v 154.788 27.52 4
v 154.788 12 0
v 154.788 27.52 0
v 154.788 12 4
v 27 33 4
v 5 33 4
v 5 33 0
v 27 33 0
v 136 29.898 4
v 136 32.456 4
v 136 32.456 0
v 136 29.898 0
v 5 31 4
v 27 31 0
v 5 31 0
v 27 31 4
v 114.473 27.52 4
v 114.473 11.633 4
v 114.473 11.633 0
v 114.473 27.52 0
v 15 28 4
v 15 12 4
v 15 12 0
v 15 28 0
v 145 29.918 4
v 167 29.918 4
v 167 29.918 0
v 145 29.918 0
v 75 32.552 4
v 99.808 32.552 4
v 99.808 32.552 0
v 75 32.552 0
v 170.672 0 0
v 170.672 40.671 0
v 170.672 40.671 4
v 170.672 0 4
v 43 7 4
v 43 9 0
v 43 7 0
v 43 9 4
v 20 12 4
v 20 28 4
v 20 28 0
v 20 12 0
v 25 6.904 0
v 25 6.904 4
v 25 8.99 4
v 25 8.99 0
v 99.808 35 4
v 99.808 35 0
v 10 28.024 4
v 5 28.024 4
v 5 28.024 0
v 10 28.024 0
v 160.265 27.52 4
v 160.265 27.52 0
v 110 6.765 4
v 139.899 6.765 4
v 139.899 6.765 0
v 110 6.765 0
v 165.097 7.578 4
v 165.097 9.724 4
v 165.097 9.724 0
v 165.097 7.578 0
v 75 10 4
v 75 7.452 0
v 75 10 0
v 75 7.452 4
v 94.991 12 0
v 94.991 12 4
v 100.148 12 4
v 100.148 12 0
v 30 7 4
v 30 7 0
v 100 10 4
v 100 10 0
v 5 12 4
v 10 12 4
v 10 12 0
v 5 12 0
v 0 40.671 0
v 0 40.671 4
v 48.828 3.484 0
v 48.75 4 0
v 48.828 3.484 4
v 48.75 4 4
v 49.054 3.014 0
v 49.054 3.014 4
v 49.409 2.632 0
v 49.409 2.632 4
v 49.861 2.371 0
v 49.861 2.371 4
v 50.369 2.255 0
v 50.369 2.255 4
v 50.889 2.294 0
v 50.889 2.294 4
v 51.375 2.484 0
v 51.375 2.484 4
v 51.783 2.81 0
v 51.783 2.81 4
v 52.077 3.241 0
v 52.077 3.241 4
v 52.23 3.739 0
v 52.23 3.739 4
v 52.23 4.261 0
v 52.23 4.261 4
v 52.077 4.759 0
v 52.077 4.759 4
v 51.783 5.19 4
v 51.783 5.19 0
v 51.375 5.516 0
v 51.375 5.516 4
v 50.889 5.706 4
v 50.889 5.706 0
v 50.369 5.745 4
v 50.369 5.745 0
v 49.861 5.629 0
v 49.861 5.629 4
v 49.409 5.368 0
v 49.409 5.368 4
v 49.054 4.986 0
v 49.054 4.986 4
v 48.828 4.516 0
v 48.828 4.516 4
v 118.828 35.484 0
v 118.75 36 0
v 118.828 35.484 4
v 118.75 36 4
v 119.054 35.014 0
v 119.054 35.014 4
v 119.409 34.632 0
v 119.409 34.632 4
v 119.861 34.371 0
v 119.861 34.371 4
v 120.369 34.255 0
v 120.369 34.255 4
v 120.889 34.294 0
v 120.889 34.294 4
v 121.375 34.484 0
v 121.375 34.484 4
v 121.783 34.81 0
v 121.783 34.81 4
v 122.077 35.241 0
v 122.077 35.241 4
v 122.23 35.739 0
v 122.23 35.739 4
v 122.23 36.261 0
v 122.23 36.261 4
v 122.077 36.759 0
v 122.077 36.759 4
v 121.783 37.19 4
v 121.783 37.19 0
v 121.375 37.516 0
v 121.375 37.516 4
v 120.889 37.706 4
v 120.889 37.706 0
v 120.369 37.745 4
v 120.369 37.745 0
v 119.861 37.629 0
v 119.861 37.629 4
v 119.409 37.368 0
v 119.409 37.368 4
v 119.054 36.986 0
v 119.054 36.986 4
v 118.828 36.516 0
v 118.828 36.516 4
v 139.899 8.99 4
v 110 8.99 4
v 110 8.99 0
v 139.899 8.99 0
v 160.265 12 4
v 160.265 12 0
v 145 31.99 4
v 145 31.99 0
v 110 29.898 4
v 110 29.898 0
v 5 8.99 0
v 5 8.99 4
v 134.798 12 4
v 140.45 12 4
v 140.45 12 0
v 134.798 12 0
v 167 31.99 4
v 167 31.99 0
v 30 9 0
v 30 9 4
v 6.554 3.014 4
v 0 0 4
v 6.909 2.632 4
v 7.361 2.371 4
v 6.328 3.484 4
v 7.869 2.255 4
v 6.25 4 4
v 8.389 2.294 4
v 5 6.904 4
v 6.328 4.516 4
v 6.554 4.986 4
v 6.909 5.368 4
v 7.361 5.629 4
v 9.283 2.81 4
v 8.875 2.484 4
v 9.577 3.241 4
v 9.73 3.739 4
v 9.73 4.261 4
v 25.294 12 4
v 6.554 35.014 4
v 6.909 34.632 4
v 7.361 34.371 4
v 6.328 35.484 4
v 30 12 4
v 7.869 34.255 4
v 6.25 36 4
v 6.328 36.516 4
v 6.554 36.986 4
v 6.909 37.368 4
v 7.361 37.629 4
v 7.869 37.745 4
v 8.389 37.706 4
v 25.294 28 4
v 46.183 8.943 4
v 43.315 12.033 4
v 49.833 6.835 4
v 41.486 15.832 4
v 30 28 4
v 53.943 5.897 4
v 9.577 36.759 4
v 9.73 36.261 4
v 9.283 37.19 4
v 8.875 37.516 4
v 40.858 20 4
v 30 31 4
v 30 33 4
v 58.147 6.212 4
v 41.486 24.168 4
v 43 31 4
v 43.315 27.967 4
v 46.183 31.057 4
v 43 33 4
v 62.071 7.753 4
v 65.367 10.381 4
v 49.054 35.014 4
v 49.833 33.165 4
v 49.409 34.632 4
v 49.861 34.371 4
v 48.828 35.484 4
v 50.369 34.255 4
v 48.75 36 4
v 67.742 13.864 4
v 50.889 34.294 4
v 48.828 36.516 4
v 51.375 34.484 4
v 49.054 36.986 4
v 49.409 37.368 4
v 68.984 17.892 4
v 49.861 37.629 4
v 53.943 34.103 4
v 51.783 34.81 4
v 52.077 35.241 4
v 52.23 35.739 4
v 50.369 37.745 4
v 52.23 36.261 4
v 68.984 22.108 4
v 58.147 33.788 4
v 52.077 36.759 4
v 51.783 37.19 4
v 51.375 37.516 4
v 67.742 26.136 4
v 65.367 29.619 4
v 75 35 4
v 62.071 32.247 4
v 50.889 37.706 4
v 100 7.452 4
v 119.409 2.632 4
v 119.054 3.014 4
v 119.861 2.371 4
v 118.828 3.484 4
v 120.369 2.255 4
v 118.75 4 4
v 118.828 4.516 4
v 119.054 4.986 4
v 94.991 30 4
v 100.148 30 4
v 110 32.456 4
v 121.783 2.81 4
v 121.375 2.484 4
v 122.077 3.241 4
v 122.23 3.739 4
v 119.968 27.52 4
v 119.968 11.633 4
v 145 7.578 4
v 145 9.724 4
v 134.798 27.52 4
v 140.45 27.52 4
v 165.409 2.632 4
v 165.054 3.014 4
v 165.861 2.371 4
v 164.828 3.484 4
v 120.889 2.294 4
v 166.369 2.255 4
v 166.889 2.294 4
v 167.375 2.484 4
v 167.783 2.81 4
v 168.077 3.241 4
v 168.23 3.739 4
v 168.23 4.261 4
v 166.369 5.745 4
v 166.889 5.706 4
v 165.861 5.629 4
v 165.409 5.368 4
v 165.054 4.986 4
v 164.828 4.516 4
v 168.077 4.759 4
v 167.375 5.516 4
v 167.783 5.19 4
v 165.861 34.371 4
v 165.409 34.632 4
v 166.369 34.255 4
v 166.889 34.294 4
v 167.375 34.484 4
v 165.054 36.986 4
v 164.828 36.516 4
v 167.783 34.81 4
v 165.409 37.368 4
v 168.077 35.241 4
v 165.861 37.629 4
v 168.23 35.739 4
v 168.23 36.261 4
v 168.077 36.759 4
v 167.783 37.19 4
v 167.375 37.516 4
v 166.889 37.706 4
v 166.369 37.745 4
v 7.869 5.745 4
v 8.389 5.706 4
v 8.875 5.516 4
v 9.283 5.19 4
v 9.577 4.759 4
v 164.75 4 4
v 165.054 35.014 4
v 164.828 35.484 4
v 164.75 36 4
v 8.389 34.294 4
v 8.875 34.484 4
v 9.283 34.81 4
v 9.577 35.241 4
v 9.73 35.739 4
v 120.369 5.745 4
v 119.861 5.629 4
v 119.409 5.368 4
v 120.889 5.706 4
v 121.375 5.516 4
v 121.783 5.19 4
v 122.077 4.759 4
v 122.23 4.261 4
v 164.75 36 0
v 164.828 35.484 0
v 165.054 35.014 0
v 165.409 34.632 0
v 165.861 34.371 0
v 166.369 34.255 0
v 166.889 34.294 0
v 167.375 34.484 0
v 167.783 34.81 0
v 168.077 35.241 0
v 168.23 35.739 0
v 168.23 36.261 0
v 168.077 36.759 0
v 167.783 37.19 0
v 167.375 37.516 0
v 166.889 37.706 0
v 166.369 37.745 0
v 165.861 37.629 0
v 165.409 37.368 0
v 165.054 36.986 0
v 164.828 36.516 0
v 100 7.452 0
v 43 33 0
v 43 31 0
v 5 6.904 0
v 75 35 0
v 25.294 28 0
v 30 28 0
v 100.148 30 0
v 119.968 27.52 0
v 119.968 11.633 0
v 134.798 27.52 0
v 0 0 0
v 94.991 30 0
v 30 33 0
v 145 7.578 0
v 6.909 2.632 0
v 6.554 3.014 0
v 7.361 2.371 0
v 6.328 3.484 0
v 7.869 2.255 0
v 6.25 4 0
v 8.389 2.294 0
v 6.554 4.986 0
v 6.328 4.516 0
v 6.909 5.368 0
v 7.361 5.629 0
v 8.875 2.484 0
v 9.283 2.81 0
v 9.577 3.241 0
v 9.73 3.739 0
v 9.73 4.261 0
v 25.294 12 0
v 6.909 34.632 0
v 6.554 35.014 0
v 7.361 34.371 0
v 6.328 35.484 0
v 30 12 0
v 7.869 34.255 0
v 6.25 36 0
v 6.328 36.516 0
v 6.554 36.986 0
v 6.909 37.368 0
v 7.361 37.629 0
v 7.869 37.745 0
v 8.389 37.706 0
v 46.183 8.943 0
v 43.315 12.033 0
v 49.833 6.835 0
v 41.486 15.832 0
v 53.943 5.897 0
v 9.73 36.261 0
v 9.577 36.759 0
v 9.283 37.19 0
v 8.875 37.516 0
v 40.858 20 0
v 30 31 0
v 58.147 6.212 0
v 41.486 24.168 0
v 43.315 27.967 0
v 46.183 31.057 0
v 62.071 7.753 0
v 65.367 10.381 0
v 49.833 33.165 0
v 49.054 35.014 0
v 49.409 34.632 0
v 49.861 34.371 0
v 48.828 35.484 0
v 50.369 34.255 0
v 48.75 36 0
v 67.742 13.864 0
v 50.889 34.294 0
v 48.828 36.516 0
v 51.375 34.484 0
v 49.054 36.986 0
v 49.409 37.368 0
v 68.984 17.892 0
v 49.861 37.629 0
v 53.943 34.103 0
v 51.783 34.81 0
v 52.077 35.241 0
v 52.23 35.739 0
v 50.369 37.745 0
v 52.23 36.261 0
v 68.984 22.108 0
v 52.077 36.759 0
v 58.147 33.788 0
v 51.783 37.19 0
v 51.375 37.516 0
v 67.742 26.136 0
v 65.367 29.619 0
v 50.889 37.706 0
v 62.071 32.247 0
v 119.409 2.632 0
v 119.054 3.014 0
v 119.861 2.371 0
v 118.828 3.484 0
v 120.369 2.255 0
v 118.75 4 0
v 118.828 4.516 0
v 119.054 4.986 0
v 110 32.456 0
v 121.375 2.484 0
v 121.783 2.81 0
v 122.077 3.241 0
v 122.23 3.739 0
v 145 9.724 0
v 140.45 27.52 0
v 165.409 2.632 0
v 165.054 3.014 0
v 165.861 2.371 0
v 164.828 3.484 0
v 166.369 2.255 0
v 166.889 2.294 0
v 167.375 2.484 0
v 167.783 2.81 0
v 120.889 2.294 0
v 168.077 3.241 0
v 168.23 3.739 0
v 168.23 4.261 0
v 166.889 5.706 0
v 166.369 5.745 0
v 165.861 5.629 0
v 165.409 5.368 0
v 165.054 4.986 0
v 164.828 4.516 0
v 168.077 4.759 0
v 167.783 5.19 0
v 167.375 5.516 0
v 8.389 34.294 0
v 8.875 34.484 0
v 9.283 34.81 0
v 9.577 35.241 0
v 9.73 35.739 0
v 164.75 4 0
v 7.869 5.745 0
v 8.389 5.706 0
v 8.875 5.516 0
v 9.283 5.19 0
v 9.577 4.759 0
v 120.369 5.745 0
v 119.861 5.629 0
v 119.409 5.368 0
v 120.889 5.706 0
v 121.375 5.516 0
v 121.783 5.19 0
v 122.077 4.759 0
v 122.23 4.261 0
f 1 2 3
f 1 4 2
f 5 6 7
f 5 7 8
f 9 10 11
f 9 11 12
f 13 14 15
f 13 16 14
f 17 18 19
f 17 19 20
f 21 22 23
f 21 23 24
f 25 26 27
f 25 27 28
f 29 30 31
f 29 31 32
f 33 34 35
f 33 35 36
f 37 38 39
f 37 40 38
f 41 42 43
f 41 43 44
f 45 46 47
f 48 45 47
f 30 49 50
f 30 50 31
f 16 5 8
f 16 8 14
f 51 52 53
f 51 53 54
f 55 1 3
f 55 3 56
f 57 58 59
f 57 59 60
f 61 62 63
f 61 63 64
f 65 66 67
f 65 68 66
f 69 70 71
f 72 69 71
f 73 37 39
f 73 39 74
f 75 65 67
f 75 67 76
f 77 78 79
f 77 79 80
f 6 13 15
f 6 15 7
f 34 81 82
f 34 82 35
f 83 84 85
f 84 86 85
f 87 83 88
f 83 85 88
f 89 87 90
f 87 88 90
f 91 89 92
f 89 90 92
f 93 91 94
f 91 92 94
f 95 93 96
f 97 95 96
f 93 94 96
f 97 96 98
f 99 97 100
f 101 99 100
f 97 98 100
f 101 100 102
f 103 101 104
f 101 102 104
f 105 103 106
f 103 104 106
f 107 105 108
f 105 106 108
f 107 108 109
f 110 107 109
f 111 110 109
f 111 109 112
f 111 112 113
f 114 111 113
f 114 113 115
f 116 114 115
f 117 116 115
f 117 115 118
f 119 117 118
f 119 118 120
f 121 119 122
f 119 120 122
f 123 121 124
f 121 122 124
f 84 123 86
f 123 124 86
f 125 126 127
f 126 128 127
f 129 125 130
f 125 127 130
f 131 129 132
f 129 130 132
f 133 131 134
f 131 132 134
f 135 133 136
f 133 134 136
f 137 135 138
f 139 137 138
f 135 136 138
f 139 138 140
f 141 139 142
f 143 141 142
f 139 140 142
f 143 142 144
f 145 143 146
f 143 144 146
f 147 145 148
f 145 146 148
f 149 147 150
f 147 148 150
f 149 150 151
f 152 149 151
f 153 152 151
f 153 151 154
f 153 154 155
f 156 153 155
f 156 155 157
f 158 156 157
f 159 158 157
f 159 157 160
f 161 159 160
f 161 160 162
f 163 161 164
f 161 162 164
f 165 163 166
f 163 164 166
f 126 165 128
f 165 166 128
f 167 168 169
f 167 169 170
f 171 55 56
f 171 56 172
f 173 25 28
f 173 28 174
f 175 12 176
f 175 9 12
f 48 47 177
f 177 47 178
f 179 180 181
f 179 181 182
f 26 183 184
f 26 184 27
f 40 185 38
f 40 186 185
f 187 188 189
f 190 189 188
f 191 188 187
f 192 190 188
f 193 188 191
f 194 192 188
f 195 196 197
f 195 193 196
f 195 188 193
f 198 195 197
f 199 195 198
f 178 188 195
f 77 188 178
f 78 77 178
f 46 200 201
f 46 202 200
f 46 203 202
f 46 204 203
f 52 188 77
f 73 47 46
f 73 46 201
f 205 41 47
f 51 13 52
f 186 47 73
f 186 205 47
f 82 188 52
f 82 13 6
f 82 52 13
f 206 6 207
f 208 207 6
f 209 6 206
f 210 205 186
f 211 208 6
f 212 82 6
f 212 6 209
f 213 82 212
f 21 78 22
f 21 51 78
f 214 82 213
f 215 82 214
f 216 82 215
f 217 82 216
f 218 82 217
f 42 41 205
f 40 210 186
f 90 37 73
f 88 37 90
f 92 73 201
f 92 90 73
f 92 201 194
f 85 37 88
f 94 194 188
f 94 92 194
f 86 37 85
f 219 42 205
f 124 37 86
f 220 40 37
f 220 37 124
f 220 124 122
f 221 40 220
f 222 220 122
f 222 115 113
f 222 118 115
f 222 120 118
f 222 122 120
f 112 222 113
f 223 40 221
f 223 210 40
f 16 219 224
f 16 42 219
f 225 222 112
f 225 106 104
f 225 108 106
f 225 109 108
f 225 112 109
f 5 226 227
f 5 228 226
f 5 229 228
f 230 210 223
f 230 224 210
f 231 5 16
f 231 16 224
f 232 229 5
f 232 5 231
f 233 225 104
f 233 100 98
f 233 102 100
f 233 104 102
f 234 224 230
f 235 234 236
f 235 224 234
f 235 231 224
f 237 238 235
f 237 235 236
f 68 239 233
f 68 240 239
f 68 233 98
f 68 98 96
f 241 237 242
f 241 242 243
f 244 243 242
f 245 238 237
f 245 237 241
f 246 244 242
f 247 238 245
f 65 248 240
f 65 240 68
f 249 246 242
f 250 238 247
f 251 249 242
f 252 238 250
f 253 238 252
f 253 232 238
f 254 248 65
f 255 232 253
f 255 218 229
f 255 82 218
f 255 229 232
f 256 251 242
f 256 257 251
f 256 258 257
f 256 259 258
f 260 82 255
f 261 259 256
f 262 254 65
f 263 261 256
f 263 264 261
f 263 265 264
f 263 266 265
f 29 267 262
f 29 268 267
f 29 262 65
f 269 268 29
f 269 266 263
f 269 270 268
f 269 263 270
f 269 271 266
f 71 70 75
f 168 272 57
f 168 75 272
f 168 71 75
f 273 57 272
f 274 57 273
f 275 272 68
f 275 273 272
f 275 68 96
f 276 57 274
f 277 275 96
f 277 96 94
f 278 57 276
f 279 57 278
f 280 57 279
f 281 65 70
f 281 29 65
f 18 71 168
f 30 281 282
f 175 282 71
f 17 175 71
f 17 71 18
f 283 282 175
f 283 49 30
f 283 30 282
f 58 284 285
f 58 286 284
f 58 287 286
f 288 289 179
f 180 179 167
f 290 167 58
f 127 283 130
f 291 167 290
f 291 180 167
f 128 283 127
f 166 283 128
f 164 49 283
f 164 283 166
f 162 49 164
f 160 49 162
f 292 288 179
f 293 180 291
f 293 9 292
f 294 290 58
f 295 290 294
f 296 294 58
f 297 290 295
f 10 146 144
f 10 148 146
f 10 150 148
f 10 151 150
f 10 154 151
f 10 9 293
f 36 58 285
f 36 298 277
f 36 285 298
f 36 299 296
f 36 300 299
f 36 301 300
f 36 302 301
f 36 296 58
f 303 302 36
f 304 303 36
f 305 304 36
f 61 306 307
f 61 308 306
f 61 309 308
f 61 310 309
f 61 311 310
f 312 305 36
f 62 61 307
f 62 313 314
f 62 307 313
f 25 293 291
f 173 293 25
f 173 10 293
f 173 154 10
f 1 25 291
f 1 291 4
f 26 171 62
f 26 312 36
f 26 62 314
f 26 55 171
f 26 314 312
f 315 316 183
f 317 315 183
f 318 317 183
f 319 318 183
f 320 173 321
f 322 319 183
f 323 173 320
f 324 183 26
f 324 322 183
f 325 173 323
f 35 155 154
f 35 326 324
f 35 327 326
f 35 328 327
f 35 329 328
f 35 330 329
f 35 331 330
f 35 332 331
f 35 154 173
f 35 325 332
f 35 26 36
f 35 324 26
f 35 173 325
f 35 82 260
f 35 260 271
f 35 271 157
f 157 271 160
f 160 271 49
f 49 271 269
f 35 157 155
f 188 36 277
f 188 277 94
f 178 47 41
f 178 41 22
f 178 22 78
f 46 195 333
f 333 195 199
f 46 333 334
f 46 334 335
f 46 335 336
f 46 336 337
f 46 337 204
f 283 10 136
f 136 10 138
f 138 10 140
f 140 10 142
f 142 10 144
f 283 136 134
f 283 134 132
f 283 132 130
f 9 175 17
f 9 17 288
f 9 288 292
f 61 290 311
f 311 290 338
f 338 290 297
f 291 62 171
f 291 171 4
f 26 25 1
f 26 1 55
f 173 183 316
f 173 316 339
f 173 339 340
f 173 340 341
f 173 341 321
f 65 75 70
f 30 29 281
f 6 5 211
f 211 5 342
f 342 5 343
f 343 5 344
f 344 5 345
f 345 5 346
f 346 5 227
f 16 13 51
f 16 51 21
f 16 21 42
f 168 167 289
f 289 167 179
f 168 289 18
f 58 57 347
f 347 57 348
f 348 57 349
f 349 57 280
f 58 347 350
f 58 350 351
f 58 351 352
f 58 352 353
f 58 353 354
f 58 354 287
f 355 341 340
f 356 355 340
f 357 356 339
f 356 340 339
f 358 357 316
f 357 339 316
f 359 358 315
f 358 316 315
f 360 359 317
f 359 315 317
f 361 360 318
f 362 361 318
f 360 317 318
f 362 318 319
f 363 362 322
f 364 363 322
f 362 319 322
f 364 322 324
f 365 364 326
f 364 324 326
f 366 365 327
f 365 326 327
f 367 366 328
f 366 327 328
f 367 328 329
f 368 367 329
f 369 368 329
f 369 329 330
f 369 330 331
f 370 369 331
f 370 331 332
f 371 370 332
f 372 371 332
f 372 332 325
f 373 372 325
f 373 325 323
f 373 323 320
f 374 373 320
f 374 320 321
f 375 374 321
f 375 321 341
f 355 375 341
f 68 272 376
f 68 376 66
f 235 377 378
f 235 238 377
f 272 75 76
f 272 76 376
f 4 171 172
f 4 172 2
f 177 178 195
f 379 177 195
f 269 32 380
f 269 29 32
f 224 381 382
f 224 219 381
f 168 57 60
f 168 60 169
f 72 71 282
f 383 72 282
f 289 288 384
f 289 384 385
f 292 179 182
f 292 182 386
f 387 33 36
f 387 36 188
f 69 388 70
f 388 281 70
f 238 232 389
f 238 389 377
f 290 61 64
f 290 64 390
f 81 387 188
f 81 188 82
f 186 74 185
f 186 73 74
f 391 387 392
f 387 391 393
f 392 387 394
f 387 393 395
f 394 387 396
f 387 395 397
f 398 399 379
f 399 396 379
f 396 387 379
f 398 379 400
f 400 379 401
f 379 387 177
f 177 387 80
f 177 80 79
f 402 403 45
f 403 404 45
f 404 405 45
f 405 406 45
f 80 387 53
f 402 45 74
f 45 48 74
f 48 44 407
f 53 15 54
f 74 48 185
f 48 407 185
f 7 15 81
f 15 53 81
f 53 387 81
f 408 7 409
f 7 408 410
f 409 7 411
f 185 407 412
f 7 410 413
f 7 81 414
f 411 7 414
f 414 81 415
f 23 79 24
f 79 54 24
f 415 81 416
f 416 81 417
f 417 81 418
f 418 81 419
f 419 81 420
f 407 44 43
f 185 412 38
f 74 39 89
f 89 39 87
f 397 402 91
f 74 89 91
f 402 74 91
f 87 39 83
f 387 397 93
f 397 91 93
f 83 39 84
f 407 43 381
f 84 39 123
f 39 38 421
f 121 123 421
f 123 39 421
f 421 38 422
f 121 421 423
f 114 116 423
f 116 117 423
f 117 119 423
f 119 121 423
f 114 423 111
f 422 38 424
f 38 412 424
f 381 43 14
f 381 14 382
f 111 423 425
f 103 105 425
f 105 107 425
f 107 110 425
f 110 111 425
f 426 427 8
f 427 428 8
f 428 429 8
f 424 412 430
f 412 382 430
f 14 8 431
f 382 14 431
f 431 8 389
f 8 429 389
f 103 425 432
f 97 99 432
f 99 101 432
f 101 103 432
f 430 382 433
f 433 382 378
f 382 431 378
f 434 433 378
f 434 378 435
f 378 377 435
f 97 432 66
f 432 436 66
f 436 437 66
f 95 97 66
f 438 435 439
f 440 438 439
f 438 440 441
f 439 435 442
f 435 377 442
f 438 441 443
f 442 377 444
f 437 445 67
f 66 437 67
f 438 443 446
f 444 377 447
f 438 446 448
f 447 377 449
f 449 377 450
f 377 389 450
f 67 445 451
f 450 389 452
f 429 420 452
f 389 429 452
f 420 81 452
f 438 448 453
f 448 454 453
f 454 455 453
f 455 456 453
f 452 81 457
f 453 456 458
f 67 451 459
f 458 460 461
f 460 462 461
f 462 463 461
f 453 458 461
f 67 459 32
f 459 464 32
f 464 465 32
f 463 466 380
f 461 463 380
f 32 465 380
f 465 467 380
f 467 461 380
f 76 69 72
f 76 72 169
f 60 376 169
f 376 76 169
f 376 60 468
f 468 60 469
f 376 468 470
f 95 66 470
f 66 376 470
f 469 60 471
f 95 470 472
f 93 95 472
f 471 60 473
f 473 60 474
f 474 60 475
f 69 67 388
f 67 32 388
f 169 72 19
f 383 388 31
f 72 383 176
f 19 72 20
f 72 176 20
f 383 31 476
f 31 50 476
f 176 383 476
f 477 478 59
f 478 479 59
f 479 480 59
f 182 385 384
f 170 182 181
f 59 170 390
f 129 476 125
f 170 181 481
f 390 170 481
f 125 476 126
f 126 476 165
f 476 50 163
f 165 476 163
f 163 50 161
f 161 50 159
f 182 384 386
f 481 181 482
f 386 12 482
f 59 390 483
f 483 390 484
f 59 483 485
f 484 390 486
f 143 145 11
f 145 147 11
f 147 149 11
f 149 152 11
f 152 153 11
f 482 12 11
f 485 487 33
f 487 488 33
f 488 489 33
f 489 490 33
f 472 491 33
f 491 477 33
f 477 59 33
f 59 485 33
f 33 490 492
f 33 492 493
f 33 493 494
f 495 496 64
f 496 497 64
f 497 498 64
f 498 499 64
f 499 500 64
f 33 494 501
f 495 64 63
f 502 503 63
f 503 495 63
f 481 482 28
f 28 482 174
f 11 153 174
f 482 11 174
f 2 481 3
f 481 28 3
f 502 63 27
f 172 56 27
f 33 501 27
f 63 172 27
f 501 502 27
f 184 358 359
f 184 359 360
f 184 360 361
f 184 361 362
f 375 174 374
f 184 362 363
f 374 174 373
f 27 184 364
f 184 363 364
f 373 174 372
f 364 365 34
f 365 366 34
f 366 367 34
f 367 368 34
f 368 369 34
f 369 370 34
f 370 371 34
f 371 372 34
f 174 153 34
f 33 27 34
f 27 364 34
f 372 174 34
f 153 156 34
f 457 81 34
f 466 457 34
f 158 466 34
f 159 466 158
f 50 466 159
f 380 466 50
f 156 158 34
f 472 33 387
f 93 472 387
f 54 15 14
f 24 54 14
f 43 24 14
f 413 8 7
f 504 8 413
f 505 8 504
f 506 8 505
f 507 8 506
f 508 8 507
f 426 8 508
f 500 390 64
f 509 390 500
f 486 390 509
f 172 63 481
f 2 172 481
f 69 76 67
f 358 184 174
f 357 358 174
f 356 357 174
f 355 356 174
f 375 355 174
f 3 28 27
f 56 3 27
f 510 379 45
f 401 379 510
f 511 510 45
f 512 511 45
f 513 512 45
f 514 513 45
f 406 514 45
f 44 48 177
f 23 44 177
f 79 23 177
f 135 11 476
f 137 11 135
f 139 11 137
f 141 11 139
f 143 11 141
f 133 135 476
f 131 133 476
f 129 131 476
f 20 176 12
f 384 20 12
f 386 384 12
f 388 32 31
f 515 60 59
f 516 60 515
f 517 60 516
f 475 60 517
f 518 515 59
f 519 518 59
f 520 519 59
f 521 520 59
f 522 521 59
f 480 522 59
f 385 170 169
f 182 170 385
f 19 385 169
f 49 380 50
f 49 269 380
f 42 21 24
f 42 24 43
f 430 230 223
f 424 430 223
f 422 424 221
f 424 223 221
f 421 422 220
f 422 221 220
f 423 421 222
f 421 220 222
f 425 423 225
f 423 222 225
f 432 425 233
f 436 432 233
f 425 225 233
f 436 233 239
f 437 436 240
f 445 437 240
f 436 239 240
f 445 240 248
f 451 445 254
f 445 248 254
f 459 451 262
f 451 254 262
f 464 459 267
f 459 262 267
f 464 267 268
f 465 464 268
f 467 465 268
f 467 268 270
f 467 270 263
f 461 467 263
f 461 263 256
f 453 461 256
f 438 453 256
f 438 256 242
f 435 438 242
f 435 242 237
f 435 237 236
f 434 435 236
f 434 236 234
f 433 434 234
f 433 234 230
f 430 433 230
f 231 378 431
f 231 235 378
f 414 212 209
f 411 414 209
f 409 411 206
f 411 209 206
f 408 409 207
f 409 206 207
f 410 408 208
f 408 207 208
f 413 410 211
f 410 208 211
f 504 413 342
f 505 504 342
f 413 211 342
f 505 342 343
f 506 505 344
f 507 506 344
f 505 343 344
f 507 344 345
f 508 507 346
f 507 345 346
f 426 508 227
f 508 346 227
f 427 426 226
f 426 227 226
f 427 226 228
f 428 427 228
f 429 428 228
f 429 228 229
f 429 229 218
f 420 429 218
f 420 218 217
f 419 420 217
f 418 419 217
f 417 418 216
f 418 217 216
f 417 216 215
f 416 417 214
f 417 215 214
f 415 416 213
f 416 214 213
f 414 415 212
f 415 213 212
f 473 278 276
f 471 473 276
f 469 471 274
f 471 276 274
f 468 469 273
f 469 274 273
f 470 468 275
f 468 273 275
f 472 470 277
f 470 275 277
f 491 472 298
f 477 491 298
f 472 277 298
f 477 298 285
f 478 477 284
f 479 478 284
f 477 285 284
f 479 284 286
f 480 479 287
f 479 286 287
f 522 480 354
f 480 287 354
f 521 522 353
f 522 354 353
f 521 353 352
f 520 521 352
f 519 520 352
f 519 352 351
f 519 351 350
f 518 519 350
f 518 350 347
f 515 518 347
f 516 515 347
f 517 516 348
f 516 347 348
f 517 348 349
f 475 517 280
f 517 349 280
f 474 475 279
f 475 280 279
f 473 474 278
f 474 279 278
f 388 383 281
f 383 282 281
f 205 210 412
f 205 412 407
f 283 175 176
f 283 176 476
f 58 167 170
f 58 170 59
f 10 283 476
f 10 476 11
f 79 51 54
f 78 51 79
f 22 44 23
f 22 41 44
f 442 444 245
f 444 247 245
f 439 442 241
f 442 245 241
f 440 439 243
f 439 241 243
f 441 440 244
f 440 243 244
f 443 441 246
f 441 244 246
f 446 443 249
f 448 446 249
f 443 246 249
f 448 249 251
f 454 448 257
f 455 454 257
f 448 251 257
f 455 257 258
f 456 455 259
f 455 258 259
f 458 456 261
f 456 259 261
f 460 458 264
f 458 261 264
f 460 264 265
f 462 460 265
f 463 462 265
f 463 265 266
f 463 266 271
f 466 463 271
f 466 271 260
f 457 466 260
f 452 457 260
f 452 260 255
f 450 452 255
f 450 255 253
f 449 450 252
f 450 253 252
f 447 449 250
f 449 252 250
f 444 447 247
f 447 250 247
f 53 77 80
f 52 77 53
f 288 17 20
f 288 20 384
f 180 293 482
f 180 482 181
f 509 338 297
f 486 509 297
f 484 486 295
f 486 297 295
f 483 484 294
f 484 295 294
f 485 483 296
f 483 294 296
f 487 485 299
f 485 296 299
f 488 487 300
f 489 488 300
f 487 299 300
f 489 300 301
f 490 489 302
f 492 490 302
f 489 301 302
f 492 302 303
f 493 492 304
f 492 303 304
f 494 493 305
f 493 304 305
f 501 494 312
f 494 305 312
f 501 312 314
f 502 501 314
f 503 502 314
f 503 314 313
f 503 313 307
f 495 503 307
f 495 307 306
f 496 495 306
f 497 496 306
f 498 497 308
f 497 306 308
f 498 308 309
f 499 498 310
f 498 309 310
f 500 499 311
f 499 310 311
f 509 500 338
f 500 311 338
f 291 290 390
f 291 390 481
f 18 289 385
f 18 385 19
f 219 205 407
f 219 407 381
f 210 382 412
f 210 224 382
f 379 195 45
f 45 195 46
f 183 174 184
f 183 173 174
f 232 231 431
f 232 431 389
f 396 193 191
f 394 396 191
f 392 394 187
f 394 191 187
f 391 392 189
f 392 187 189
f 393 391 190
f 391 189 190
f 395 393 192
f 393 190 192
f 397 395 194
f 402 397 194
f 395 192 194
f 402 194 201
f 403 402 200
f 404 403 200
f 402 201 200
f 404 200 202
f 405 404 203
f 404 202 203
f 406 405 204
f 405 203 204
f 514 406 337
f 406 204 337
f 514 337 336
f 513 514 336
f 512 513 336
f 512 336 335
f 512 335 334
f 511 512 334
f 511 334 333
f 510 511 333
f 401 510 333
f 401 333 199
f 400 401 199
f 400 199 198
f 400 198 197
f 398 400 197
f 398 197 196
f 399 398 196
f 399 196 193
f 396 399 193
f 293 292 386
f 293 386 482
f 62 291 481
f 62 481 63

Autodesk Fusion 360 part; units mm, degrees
sketch "Sketch1" plane through (0, 0, 0) normal (0, 0, 1) x (1, 0, 0)
  line L0 (0, 40.6706) -> (170.6716, 40.6706)
  line L1 (170.6716, 40.6706) -> (170.6716, 0)
  line L2 (170.6716, 0) -> (0, 0)
  line L3 (0, 0) -> (0, 40.6706)
sketch "Sketch2" plane through (0, 0, 0) normal (0, 0, 1) x (1, 0, 0)
  circle A0 centre (2.5, 4) radius 1.75
  line L0 (170.6716, 0) -> (0, 0)
  line L1 (0, 0) -> (0, 40.6706)
  dimension "d1" = 3.5
  dimension "d2" = 4
  dimension "d3" = 2.5
sketch "Sketch4" plane through (0, 0, 0) normal (0, 0, 1) x (1, 0, 0)
  circle A0 centre (49.5, 4) radius 1.75
  circle A1 centre (2.5, 4) radius 1.75
  dimension "d9" = 3.5
  dimension "d10" = 47
extrude "Extrude1" add sketch "Sketch1" along normal blind 4
sketch "Sketch11" plane through (0, 0, 4) normal (0, 0, 1) x (-1, 0, 0)
  line L0 (0, 0) -> (-170.6716, 0)
  line L1 (-170.6716, 0) -> (-170.6716, -40.6706)
  line L2 (-170.6716, -40.6706) -> (0, -40.6706)
  line L3 (0, -40.6706) -> (0, 0)
  line L4 (-5, -30) -> (-150, -30)
  line L5 (-150, -30) -> (-150, -10)
  line L6 (-150, -10) -> (-5, -10)
  line L7 (-5, -10) -> (-5, -30)
sketch "Sketch13" plane through (0, 0, 4) normal (0, 0, 1) x (-1, 0, 0)
  line L0 (0, 0) -> (-170.6716, 0)
  line L1 (-170.6716, 0) -> (-170.6716, -40.6706)
  line L2 (-170.6716, -40.6706) -> (0, -40.6706)
  line L3 (0, -40.6706) -> (0, 0)
  circle A0 centre (-8, -4) radius 1.75
  circle A1 centre (-8, -36) radius 1.75
  circle A2 centre (-50.5, -36) radius 1.75
  circle A3 centre (-50.5, -4) radius 1.75
  circle A4 centre (-120.5, -4) radius 1.75
  circle A5 centre (-120.5, -36) radius 1.75
  circle A6 centre (-166.5, -4) radius 1.75
  circle A7 centre (-166.5, -36) radius 1.75
  dimension "d44" = 3.5
  dimension "d45" = 4
  dimension "d46" = 3.5
  dimension "d47" = 32
  dimension "d48" = 8
  dimension "d49" = 8
  dimension "d50" = 3.5
  dimension "d52" = 3.5
  dimension "d53" = 4
  dimension "d55" = 32
  dimension "d56" = 3.5
  dimension "d58" = 4
  dimension "d59" = 3.5
  dimension "d60" = 32
  dimension "d62" = 3.5
  dimension "d63" = 46
  dimension "d64" = 4
  dimension "d65" = 3.5
  dimension "d66" = 46
  dimension "d67" = 32
extrude "Extrude5" cut sketch "Sketch13" against normal blind 15 contours A0 | A1 | A2 | A3 | A4 | A5 | A6 | A7
sketch "Sketch16" plane through (0, 0, 4) normal (0, 0, 1) x (-1, 0, 0)
  circle A0 centre (-120.5, -36) radius 1.75
  circle A1 centre (-50.5, -36) radius 1.75
  circle A2 centre (-50.5, -4) radius 1.75
  circle A3 centre (-120.5, -4) radius 1.75
  circle A4 centre (-166.5, -36) radius 1.75
  circle A5 centre (-8, -36) radius 1.75
  circle A6 centre (-8, -4) radius 1.75
  circle A7 centre (-166.5, -4) radius 1.75
  line L0 (0, 0) -> (-170.6716, 0)
  line L1 (-170.6716, 0) -> (-170.6716, -40.6706)
  line L2 (-170.6716, -40.6706) -> (0, -40.6706)
  line L3 (0, -40.6706) -> (0, 0)
  line L4 (-5, -33) -> (-27, -33)
  line L5 (-27, -33) -> (-27, -31)
  line L6 (-27, -31) -> (-5, -31)
  line L7 (-5, -31) -> (-5, -33)
  line L8 (-5, -6.9037) -> (-25, -6.9037)
  line L9 (-25, -6.9037) -> (-25, -8.99)
  line L10 (-25, -8.99) -> (-5, -8.99)
  line L11 (-5, -8.99) -> (-5, -6.9037)
  line L12 (-5, -28.024) -> (-10, -28.024)
  line L13 (-10, -28.024) -> (-10, -12)
  line L14 (-10, -12) -> (-5, -12)
  line L15 (-5, -12) -> (-5, -28.024)
  line L16 (-15, -28) -> (-20, -28)
  line L17 (-20, -28) -> (-20, -12)
  line L18 (-20, -12) -> (-15, -12)
  line L19 (-15, -12) -> (-15, -28)
  line L20 (-25.2942, -28) -> (-30, -28)
  line L21 (-30, -28) -> (-30, -12)
  line L22 (-30, -12) -> (-25.2942, -12)
  line L23 (-25.2942, -12) -> (-25.2942, -28)
  line L24 (-30, -33) -> (-43, -33)
  line L25 (-43, -33) -> (-43, -31)
  line L26 (-43, -31) -> (-30, -31)
  line L27 (-30, -31) -> (-30, -33)
  line L28 (-30, -9) -> (-43, -9)
  line L29 (-43, -9) -> (-43, -7)
  line L30 (-43, -7) -> (-30, -7)
  line L31 (-30, -7) -> (-30, -9)
  circle A8 centre (-55, -20) radius 14.1421
  line L32 (-94.9908, -12) -> (-100.1485, -12)
  line L33 (-100.1485, -12) -> (-100.1485, -30)
  line L34 (-100.1485, -30) -> (-94.9908, -30)
  line L35 (-94.9908, -30) -> (-94.9908, -12)
  line L36 (-114.4734, -27.5201) -> (-119.9683, -27.5201)
  line L37 (-119.9683, -27.5201) -> (-119.9683, -11.6326)
  line L38 (-119.9683, -11.6326) -> (-114.4734, -11.6326)
  line L39 (-114.4734, -11.6326) -> (-114.4734, -27.5201)
  line L40 (-134.7975, -27.5201) -> (-140.4499, -27.5201)
  line L41 (-140.4499, -27.5201) -> (-140.4499, -12)
  line L42 (-140.4499, -12) -> (-134.7975, -12)
  line L43 (-134.7975, -12) -> (-134.7975, -27.5201)
  line L44 (-154.7885, -27.5201) -> (-160.2653, -27.5201)
  line L45 (-160.2653, -27.5201) -> (-160.2653, -12)
  line L46 (-160.2653, -12) -> (-154.7885, -12)
  line L47 (-154.7885, -12) -> (-154.7885, -27.5201)
  line L48 (-75, -10) -> (-100, -10)
  line L49 (-100, -10) -> (-100, -7.452)
  line L50 (-100, -7.452) -> (-75, -7.452)
  line L51 (-75, -7.452) -> (-75, -10)
  line L52 (-110, -8.9897) -> (-139.8992, -8.9897)
  line L53 (-139.8992, -8.9897) -> (-139.8992, -6.7652)
  line L54 (-139.8992, -6.7652) -> (-110, -6.7652)
  line L55 (-110, -6.7652) -> (-110, -8.9897)
  line L56 (-145, -9.7245) -> (-165.0971, -9.7245)
  line L57 (-165.0971, -9.7245) -> (-165.0971, -7.5785)
  line L58 (-165.0971, -7.5785) -> (-145, -7.5785)
  line L59 (-145, -7.5785) -> (-145, -9.7245)
  line L60 (-75, -35) -> (-99.8075, -35)
  line L61 (-99.8075, -35) -> (-99.8075, -32.5523)
  line L62 (-99.8075, -32.5523) -> (-75, -32.5523)
  line L63 (-75, -32.5523) -> (-75, -35)
  line L64 (-110, -32.4558) -> (-136, -32.4558)
  line L65 (-136, -32.4558) -> (-136, -29.8985)
  line L66 (-136, -29.8985) -> (-110, -29.8985)
  line L67 (-110, -29.8985) -> (-110, -32.4558)
  line L68 (-145, -31.9897) -> (-167, -31.9897)
  line L69 (-167, -31.9897) -> (-167, -29.9185)
  line L70 (-167, -29.9185) -> (-145, -29.9185)
  line L71 (-145, -29.9185) -> (-145, -31.9897)
  dimension "d78" = 22
  dimension "d79" = 3
  dimension "d81" = 13
  dimension "d82" = 13
extrude "Extrude8" cut sketch "Sketch16" against normal blind 15 contours L4 L5 L6 L7 | L8 L9 L10 L11 | L12 L13 L14 L15 | L16 L17 L18 L19 | L20 L21 L22 L23 | L24 L25 L26 L27 | L28 L29 L30 L31 | A8 | L32 L33 L34 L35 | L36 L37 L38 L39 | L40 L41 L42 L43 | L44 L45 L46 L47 | L48 L49 L50 L51 | L52 L53 L54 L55 | L56 L57 L58 L59 | L60 L61 L62 L63 | L64 L65 L66 L67 | L68 L69 L70 L71
